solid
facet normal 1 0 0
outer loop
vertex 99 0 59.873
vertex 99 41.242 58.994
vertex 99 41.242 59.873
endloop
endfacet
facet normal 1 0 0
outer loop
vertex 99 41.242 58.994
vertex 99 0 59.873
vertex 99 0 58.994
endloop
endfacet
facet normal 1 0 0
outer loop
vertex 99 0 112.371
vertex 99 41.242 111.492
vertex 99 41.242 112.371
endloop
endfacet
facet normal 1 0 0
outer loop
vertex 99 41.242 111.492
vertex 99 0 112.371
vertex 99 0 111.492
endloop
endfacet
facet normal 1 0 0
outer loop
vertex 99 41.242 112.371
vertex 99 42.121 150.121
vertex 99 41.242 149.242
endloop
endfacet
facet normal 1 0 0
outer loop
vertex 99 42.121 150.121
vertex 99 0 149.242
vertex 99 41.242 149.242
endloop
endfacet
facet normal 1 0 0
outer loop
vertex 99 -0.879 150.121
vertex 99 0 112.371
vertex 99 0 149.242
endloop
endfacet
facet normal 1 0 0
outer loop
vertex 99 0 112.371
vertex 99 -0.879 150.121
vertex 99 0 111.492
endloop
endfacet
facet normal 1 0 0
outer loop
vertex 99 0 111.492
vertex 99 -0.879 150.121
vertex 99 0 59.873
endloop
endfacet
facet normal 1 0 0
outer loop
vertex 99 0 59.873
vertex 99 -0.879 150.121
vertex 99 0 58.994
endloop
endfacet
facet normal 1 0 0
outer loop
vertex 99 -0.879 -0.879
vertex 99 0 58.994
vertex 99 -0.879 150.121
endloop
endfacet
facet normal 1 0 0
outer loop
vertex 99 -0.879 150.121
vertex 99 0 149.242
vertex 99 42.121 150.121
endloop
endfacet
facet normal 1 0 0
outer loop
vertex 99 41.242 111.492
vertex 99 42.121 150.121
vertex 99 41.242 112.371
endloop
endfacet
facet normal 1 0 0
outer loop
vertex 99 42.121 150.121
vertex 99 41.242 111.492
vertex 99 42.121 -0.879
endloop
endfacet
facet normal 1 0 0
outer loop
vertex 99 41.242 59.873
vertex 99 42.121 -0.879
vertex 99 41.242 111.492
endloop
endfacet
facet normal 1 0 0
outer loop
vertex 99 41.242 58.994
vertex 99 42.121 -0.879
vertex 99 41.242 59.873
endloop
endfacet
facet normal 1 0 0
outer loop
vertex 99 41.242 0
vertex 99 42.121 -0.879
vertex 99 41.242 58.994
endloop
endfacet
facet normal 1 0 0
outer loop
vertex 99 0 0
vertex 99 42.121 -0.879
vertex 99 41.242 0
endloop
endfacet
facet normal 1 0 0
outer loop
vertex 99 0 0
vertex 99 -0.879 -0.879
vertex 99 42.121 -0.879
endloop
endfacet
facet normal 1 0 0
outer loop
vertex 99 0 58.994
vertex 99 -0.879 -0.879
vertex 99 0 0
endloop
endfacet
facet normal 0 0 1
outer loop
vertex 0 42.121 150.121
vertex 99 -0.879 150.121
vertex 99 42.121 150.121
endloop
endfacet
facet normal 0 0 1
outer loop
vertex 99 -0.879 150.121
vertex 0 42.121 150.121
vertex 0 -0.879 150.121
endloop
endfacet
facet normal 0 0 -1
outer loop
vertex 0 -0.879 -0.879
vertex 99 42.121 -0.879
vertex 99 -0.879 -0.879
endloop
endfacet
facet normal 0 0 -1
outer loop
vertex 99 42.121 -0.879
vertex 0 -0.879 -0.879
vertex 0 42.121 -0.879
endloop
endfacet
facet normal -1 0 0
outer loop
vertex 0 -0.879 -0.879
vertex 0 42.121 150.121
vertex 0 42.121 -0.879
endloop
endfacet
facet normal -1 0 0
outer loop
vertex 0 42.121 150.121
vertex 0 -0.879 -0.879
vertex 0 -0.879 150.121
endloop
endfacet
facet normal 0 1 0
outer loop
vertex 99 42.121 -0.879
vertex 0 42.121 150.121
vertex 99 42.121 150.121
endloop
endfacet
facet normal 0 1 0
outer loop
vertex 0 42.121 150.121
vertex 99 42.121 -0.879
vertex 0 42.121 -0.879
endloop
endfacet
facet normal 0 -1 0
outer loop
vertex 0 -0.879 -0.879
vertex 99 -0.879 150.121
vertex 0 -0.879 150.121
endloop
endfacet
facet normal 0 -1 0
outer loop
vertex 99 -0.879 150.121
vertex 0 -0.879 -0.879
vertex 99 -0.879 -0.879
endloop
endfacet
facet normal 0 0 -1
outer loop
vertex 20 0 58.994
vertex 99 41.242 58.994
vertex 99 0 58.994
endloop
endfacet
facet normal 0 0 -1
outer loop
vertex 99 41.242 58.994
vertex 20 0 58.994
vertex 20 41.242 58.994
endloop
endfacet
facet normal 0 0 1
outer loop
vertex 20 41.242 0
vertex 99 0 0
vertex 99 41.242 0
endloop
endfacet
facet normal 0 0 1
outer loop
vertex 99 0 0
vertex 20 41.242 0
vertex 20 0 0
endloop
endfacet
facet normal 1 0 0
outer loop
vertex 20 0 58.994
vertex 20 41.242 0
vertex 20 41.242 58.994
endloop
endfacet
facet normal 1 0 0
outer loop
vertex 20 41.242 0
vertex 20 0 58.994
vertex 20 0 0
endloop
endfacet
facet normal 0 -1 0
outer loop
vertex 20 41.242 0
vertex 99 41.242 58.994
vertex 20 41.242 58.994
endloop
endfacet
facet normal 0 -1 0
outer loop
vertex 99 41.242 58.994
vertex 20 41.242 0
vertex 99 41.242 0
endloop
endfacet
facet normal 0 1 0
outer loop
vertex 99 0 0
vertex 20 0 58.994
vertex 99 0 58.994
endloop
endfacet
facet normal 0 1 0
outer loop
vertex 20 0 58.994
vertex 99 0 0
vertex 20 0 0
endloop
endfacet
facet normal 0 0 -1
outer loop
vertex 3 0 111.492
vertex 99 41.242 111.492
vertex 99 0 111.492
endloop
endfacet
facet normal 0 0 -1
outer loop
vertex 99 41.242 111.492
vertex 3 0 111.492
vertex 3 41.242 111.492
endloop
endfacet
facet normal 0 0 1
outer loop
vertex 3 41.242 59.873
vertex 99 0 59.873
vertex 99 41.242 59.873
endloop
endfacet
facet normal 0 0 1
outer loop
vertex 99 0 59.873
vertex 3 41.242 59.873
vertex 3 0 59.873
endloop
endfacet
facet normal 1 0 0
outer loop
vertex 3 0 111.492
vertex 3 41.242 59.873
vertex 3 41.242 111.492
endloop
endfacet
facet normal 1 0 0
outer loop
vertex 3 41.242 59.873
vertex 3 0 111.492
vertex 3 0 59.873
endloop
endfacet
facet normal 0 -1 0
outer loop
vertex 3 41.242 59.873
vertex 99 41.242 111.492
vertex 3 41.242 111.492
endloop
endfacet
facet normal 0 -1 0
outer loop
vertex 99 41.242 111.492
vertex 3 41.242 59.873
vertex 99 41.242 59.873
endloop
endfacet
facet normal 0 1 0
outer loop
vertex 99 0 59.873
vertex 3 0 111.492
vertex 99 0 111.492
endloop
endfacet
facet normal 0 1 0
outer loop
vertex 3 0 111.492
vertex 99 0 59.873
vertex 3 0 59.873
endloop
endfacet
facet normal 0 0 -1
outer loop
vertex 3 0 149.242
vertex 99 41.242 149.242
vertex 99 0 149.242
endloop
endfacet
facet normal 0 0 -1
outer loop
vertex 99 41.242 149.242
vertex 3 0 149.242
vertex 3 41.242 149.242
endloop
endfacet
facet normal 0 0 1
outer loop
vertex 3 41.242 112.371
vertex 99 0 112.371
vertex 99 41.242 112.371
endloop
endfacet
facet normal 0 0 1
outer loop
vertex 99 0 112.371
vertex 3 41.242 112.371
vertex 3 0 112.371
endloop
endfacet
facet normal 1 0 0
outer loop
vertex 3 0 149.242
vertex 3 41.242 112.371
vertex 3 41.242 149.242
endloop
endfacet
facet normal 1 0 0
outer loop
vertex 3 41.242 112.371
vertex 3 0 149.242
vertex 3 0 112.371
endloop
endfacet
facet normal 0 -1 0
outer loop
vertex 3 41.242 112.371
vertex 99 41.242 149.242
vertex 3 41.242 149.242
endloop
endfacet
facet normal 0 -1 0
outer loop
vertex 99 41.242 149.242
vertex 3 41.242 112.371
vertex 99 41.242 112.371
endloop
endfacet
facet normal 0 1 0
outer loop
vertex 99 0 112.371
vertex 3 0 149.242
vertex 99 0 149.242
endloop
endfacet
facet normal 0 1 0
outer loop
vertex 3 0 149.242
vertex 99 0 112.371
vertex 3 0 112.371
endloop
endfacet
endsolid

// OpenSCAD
twt = .879;
bt = .8;

lwh1 = [79,33,1.4*40];
lwh2 = [96,36,1.4*35];
lwh3 = [96,43,1.4*25];

bbox = [100-1,44-1,152-1];

h3 = bbox[2]-twt*4;
difference(){
    translate([0,-twt,-twt]) cube(bbox);
    translate([bbox[0]-lwh1[0],0,0])
        cube([lwh1[0],bbox[1]+-2*twt,h3*.40]);
    
    translate([bbox[0]-lwh2[0],0,h3*.40+twt])
        cube([lwh2[0],bbox[1]+-2*twt,h3*.35]);
    
    
    translate([bbox[0]-lwh3[0],0,h3*.75+2*twt])
        cube([lwh3[0],bbox[1]+-2*twt,h3*.25]);
}
